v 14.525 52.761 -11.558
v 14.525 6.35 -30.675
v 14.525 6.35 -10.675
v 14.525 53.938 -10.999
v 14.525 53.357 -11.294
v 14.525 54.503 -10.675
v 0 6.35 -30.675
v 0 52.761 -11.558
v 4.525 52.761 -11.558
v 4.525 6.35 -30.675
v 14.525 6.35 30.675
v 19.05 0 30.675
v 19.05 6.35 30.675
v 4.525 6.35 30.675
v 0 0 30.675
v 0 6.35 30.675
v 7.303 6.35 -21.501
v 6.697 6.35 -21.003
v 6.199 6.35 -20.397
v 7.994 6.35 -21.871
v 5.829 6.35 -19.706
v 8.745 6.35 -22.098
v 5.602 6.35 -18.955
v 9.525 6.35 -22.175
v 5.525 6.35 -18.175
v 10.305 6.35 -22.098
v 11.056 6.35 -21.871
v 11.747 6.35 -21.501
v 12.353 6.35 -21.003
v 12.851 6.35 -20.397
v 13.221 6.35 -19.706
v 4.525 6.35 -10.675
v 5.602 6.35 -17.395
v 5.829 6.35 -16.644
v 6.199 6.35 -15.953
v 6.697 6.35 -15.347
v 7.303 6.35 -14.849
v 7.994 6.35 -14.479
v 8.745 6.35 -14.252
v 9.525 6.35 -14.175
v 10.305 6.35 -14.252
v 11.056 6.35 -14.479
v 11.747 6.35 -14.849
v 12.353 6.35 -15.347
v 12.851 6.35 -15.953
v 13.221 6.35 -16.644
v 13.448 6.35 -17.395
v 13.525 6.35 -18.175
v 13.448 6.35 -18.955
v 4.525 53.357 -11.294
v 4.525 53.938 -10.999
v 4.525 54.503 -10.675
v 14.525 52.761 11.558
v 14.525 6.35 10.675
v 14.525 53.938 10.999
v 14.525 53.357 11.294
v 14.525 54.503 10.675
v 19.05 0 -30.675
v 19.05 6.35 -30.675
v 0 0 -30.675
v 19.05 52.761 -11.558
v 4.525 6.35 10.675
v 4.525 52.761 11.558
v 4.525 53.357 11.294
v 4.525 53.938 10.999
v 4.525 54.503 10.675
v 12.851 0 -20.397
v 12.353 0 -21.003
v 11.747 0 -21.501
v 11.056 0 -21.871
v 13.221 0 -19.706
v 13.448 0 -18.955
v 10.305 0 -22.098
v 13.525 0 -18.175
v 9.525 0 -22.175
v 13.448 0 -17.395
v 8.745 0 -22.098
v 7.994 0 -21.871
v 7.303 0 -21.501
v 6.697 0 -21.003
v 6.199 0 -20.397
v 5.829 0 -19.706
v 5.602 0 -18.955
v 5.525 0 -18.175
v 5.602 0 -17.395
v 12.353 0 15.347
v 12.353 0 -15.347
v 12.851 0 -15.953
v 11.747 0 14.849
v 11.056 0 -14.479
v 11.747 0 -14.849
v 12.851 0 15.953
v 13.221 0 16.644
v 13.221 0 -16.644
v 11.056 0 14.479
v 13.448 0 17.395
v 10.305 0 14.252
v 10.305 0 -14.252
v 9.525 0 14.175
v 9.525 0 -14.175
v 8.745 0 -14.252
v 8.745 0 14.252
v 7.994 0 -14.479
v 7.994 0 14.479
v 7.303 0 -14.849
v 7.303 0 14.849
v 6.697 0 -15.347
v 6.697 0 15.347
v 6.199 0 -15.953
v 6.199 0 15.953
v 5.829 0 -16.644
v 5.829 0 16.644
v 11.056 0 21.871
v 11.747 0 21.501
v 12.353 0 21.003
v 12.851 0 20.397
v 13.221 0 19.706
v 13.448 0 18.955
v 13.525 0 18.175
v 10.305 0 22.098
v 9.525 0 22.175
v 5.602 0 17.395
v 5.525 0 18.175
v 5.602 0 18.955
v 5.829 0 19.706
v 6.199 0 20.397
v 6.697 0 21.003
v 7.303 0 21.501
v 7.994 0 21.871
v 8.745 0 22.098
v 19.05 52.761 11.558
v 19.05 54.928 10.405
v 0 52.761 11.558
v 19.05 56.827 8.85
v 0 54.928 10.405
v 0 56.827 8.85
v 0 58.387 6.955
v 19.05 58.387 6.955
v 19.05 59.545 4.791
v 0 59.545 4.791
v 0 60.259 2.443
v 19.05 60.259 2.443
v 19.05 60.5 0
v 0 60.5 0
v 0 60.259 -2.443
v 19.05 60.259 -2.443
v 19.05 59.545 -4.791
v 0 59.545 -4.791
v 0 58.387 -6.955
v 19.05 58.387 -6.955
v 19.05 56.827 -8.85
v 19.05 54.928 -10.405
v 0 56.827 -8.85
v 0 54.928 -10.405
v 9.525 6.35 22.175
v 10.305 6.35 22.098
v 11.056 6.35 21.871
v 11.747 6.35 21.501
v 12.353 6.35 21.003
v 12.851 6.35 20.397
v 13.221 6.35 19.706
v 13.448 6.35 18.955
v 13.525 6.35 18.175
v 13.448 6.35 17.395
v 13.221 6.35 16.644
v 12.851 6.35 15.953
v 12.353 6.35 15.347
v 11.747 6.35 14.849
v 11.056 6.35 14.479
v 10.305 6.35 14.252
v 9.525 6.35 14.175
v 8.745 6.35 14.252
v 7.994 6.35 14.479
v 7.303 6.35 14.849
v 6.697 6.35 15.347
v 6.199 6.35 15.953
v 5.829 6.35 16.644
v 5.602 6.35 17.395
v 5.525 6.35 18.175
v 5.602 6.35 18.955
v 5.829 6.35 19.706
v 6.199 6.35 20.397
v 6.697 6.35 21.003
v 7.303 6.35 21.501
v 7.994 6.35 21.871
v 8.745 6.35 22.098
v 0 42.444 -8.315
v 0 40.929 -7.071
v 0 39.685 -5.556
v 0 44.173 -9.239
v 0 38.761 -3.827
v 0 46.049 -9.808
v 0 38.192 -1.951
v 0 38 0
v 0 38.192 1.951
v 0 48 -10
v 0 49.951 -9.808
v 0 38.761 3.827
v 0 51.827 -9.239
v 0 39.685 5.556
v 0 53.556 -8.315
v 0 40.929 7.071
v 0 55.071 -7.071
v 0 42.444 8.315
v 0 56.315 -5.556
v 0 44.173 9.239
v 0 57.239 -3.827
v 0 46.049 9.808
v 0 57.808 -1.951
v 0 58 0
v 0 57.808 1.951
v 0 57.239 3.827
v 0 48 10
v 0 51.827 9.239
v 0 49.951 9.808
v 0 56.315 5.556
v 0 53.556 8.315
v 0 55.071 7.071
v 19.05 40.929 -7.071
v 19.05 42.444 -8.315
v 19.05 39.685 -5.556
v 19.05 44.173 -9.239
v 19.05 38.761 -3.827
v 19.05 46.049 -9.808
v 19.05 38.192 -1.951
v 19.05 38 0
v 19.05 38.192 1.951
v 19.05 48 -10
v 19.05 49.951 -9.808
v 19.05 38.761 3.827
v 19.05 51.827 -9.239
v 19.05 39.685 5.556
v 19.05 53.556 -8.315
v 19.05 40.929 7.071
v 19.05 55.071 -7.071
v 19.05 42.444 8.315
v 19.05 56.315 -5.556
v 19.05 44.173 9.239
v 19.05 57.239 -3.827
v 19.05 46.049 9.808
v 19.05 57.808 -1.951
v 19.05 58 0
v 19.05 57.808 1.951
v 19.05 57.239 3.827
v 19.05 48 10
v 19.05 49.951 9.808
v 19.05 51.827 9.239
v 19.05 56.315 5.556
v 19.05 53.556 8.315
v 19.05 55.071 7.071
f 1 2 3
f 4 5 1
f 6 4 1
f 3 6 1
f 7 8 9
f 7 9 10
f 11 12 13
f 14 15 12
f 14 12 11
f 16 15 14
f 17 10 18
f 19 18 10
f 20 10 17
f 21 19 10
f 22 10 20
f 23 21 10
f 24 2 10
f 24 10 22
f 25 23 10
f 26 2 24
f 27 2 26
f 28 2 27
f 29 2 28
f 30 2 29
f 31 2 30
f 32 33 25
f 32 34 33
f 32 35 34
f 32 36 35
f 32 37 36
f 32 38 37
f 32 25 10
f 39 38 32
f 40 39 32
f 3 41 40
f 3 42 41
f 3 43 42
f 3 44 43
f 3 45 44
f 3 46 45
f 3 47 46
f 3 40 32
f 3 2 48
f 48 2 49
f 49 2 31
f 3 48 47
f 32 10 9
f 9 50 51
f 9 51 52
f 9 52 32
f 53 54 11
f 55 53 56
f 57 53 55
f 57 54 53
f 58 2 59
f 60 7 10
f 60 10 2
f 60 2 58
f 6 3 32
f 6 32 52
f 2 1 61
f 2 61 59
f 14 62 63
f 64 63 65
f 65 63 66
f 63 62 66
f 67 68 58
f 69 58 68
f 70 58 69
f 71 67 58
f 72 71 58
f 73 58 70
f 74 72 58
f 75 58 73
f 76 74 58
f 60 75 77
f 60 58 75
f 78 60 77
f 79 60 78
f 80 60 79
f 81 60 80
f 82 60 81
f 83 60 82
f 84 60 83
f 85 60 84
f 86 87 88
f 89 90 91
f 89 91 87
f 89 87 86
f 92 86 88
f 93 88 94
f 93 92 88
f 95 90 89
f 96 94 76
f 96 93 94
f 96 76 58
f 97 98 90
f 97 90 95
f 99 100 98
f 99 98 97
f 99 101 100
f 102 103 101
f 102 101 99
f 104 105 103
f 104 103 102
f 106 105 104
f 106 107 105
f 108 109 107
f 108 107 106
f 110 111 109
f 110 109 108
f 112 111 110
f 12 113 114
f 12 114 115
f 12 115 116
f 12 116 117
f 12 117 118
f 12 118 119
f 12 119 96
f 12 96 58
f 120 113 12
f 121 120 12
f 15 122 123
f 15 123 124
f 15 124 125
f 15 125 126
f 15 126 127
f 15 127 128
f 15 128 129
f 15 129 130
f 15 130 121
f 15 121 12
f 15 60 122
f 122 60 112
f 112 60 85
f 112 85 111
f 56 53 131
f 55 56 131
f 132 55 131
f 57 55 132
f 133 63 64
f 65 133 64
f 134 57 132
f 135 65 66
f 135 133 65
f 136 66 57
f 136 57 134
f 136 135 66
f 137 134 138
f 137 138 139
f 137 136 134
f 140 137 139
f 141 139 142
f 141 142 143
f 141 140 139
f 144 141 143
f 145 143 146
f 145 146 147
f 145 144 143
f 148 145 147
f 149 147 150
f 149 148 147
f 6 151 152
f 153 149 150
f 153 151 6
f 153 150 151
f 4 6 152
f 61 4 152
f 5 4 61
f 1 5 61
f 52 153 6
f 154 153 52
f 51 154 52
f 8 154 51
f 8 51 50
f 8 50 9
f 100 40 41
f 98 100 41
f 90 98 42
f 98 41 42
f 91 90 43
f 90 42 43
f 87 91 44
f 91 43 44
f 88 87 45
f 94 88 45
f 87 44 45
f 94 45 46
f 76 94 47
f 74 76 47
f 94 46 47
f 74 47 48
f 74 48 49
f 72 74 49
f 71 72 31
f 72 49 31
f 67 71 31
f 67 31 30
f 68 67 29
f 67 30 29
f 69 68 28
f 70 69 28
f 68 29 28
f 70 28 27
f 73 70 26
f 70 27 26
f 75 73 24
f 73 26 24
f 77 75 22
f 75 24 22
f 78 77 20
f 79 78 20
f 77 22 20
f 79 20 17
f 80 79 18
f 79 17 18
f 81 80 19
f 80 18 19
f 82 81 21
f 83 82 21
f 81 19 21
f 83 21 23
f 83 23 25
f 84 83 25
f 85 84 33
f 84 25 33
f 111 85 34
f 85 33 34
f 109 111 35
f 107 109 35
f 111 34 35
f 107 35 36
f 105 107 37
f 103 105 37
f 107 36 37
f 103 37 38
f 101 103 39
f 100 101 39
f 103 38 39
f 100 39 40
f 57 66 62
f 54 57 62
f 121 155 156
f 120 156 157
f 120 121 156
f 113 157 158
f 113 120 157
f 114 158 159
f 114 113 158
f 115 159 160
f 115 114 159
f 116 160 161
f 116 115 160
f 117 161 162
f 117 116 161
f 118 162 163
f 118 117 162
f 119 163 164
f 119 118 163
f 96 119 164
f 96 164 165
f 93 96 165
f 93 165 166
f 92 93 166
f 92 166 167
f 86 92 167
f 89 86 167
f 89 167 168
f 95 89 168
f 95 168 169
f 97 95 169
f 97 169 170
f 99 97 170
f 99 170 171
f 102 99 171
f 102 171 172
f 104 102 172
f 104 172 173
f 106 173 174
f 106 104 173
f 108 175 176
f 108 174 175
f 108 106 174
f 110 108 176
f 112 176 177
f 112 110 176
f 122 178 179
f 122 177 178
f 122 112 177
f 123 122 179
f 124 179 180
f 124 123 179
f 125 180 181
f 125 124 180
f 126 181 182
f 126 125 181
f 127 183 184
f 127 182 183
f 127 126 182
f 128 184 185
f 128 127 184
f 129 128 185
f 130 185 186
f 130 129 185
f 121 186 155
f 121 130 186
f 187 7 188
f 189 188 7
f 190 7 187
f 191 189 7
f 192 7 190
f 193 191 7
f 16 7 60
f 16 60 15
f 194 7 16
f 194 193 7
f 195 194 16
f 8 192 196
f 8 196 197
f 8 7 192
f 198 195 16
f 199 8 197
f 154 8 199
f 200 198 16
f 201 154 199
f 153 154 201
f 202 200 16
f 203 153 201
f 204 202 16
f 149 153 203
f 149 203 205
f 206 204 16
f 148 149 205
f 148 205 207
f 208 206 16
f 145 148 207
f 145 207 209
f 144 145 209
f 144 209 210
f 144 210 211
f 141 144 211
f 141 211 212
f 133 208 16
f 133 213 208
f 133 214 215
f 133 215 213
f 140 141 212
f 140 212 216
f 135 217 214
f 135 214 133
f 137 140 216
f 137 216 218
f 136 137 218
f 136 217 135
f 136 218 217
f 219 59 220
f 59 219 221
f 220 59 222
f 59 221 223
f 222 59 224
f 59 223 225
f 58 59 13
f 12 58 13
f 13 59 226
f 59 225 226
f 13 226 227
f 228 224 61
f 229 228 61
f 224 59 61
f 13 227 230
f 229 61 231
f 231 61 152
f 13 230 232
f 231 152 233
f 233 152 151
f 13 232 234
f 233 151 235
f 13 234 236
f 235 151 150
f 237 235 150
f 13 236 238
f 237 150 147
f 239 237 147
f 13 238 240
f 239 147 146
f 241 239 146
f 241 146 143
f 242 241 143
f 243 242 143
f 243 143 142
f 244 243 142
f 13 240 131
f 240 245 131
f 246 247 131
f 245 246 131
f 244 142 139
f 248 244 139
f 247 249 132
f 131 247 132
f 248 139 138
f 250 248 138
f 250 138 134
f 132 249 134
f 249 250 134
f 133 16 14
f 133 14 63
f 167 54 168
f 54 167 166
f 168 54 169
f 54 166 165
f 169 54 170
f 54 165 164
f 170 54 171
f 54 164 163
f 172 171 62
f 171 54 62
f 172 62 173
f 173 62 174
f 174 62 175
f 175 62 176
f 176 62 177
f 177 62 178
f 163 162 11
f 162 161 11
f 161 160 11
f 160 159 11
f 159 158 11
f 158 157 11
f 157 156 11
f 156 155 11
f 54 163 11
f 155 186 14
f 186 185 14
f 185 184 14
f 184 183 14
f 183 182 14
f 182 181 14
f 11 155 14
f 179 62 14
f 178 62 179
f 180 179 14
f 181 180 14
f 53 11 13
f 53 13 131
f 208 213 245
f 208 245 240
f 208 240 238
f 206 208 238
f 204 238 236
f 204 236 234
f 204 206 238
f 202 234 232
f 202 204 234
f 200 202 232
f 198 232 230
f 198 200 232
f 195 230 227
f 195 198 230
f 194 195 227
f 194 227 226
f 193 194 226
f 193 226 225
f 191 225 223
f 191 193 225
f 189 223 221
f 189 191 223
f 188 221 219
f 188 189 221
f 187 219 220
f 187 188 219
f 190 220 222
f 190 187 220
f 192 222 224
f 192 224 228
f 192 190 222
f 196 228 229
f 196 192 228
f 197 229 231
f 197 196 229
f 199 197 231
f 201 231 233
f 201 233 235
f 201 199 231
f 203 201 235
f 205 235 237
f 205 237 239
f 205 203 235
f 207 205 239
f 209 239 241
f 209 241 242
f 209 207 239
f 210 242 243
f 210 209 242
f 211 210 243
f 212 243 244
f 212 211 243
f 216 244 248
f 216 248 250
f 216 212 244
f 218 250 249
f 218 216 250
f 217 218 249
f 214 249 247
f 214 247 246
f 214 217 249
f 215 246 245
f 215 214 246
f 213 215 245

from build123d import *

# Parameters (mm, degrees)
SKETCH1_R           = 10
BOSS_EXTRUDE1_DEPTH = 19.05
SKETCH2_R           = 4
CUT_EXTRUDE1_DEPTH  = 83.63609118
CUT_EXTRUDE2_DEPTH  = 5


with BuildPart() as part:
    # Sketch1 → Boss-Extrude1 (new body)
    with BuildSketch(Plane(origin=(0, 0, 0), x_dir=(0, 0, -1), z_dir=(1, 0, 0))):
        with BuildLine():
            Line((-30.675, 0), (-30.675, 6.35))
            Line((-30.675, 6.35), (-11.55788149, 52.76081668))
            ThreePointArc((-11.55788149, 52.76081668), (0, 60.5), (11.55788149, 52.76081668))
            Line((11.55788149, 52.76081668), (30.675, 6.35))
            Line((30.675, 6.35), (30.675, 0))
            Line((30.675, 0), (-30.675, 0))
        make_face()
        with Locations(Location((0, 48, 0), (0, 0, 180))):
            Circle(SKETCH1_R, mode=Mode.SUBTRACT)
    extrude(amount=BOSS_EXTRUDE1_DEPTH)

    # Sketch2 → Cut-Extrude1 (cut, symmetric)
    with BuildSketch(Plane(origin=(0, 0, 0), x_dir=(1, 0, 0), z_dir=(0, 1, 0))):
        with Locations(Location((9.525, -18.175, 0), (0, 0, 270))):
            Circle(SKETCH2_R)
        with Locations(Location((9.525, 18.175, 0), (0, 0, 270))):
            Circle(SKETCH2_R)
    extrude(amount=CUT_EXTRUDE1_DEPTH, both=True, mode=Mode.SUBTRACT)

    # Sketch3 → Cut-Extrude2 (cut, symmetric)
    with BuildSketch(Plane(origin=(9.525, 0, 0), x_dir=(0, 0, -1), z_dir=(1, 0, 0))):
        Polygon((-10.675, 54.904196759), (-10.675, 6.35), (-30.675, 6.35), align=None)
        Polygon((10.675, 54.904196759), (30.675, 6.35), (10.675, 6.35), align=None)
    extrude(amount=CUT_EXTRUDE2_DEPTH, both=True, mode=Mode.SUBTRACT)


solid = part.part
